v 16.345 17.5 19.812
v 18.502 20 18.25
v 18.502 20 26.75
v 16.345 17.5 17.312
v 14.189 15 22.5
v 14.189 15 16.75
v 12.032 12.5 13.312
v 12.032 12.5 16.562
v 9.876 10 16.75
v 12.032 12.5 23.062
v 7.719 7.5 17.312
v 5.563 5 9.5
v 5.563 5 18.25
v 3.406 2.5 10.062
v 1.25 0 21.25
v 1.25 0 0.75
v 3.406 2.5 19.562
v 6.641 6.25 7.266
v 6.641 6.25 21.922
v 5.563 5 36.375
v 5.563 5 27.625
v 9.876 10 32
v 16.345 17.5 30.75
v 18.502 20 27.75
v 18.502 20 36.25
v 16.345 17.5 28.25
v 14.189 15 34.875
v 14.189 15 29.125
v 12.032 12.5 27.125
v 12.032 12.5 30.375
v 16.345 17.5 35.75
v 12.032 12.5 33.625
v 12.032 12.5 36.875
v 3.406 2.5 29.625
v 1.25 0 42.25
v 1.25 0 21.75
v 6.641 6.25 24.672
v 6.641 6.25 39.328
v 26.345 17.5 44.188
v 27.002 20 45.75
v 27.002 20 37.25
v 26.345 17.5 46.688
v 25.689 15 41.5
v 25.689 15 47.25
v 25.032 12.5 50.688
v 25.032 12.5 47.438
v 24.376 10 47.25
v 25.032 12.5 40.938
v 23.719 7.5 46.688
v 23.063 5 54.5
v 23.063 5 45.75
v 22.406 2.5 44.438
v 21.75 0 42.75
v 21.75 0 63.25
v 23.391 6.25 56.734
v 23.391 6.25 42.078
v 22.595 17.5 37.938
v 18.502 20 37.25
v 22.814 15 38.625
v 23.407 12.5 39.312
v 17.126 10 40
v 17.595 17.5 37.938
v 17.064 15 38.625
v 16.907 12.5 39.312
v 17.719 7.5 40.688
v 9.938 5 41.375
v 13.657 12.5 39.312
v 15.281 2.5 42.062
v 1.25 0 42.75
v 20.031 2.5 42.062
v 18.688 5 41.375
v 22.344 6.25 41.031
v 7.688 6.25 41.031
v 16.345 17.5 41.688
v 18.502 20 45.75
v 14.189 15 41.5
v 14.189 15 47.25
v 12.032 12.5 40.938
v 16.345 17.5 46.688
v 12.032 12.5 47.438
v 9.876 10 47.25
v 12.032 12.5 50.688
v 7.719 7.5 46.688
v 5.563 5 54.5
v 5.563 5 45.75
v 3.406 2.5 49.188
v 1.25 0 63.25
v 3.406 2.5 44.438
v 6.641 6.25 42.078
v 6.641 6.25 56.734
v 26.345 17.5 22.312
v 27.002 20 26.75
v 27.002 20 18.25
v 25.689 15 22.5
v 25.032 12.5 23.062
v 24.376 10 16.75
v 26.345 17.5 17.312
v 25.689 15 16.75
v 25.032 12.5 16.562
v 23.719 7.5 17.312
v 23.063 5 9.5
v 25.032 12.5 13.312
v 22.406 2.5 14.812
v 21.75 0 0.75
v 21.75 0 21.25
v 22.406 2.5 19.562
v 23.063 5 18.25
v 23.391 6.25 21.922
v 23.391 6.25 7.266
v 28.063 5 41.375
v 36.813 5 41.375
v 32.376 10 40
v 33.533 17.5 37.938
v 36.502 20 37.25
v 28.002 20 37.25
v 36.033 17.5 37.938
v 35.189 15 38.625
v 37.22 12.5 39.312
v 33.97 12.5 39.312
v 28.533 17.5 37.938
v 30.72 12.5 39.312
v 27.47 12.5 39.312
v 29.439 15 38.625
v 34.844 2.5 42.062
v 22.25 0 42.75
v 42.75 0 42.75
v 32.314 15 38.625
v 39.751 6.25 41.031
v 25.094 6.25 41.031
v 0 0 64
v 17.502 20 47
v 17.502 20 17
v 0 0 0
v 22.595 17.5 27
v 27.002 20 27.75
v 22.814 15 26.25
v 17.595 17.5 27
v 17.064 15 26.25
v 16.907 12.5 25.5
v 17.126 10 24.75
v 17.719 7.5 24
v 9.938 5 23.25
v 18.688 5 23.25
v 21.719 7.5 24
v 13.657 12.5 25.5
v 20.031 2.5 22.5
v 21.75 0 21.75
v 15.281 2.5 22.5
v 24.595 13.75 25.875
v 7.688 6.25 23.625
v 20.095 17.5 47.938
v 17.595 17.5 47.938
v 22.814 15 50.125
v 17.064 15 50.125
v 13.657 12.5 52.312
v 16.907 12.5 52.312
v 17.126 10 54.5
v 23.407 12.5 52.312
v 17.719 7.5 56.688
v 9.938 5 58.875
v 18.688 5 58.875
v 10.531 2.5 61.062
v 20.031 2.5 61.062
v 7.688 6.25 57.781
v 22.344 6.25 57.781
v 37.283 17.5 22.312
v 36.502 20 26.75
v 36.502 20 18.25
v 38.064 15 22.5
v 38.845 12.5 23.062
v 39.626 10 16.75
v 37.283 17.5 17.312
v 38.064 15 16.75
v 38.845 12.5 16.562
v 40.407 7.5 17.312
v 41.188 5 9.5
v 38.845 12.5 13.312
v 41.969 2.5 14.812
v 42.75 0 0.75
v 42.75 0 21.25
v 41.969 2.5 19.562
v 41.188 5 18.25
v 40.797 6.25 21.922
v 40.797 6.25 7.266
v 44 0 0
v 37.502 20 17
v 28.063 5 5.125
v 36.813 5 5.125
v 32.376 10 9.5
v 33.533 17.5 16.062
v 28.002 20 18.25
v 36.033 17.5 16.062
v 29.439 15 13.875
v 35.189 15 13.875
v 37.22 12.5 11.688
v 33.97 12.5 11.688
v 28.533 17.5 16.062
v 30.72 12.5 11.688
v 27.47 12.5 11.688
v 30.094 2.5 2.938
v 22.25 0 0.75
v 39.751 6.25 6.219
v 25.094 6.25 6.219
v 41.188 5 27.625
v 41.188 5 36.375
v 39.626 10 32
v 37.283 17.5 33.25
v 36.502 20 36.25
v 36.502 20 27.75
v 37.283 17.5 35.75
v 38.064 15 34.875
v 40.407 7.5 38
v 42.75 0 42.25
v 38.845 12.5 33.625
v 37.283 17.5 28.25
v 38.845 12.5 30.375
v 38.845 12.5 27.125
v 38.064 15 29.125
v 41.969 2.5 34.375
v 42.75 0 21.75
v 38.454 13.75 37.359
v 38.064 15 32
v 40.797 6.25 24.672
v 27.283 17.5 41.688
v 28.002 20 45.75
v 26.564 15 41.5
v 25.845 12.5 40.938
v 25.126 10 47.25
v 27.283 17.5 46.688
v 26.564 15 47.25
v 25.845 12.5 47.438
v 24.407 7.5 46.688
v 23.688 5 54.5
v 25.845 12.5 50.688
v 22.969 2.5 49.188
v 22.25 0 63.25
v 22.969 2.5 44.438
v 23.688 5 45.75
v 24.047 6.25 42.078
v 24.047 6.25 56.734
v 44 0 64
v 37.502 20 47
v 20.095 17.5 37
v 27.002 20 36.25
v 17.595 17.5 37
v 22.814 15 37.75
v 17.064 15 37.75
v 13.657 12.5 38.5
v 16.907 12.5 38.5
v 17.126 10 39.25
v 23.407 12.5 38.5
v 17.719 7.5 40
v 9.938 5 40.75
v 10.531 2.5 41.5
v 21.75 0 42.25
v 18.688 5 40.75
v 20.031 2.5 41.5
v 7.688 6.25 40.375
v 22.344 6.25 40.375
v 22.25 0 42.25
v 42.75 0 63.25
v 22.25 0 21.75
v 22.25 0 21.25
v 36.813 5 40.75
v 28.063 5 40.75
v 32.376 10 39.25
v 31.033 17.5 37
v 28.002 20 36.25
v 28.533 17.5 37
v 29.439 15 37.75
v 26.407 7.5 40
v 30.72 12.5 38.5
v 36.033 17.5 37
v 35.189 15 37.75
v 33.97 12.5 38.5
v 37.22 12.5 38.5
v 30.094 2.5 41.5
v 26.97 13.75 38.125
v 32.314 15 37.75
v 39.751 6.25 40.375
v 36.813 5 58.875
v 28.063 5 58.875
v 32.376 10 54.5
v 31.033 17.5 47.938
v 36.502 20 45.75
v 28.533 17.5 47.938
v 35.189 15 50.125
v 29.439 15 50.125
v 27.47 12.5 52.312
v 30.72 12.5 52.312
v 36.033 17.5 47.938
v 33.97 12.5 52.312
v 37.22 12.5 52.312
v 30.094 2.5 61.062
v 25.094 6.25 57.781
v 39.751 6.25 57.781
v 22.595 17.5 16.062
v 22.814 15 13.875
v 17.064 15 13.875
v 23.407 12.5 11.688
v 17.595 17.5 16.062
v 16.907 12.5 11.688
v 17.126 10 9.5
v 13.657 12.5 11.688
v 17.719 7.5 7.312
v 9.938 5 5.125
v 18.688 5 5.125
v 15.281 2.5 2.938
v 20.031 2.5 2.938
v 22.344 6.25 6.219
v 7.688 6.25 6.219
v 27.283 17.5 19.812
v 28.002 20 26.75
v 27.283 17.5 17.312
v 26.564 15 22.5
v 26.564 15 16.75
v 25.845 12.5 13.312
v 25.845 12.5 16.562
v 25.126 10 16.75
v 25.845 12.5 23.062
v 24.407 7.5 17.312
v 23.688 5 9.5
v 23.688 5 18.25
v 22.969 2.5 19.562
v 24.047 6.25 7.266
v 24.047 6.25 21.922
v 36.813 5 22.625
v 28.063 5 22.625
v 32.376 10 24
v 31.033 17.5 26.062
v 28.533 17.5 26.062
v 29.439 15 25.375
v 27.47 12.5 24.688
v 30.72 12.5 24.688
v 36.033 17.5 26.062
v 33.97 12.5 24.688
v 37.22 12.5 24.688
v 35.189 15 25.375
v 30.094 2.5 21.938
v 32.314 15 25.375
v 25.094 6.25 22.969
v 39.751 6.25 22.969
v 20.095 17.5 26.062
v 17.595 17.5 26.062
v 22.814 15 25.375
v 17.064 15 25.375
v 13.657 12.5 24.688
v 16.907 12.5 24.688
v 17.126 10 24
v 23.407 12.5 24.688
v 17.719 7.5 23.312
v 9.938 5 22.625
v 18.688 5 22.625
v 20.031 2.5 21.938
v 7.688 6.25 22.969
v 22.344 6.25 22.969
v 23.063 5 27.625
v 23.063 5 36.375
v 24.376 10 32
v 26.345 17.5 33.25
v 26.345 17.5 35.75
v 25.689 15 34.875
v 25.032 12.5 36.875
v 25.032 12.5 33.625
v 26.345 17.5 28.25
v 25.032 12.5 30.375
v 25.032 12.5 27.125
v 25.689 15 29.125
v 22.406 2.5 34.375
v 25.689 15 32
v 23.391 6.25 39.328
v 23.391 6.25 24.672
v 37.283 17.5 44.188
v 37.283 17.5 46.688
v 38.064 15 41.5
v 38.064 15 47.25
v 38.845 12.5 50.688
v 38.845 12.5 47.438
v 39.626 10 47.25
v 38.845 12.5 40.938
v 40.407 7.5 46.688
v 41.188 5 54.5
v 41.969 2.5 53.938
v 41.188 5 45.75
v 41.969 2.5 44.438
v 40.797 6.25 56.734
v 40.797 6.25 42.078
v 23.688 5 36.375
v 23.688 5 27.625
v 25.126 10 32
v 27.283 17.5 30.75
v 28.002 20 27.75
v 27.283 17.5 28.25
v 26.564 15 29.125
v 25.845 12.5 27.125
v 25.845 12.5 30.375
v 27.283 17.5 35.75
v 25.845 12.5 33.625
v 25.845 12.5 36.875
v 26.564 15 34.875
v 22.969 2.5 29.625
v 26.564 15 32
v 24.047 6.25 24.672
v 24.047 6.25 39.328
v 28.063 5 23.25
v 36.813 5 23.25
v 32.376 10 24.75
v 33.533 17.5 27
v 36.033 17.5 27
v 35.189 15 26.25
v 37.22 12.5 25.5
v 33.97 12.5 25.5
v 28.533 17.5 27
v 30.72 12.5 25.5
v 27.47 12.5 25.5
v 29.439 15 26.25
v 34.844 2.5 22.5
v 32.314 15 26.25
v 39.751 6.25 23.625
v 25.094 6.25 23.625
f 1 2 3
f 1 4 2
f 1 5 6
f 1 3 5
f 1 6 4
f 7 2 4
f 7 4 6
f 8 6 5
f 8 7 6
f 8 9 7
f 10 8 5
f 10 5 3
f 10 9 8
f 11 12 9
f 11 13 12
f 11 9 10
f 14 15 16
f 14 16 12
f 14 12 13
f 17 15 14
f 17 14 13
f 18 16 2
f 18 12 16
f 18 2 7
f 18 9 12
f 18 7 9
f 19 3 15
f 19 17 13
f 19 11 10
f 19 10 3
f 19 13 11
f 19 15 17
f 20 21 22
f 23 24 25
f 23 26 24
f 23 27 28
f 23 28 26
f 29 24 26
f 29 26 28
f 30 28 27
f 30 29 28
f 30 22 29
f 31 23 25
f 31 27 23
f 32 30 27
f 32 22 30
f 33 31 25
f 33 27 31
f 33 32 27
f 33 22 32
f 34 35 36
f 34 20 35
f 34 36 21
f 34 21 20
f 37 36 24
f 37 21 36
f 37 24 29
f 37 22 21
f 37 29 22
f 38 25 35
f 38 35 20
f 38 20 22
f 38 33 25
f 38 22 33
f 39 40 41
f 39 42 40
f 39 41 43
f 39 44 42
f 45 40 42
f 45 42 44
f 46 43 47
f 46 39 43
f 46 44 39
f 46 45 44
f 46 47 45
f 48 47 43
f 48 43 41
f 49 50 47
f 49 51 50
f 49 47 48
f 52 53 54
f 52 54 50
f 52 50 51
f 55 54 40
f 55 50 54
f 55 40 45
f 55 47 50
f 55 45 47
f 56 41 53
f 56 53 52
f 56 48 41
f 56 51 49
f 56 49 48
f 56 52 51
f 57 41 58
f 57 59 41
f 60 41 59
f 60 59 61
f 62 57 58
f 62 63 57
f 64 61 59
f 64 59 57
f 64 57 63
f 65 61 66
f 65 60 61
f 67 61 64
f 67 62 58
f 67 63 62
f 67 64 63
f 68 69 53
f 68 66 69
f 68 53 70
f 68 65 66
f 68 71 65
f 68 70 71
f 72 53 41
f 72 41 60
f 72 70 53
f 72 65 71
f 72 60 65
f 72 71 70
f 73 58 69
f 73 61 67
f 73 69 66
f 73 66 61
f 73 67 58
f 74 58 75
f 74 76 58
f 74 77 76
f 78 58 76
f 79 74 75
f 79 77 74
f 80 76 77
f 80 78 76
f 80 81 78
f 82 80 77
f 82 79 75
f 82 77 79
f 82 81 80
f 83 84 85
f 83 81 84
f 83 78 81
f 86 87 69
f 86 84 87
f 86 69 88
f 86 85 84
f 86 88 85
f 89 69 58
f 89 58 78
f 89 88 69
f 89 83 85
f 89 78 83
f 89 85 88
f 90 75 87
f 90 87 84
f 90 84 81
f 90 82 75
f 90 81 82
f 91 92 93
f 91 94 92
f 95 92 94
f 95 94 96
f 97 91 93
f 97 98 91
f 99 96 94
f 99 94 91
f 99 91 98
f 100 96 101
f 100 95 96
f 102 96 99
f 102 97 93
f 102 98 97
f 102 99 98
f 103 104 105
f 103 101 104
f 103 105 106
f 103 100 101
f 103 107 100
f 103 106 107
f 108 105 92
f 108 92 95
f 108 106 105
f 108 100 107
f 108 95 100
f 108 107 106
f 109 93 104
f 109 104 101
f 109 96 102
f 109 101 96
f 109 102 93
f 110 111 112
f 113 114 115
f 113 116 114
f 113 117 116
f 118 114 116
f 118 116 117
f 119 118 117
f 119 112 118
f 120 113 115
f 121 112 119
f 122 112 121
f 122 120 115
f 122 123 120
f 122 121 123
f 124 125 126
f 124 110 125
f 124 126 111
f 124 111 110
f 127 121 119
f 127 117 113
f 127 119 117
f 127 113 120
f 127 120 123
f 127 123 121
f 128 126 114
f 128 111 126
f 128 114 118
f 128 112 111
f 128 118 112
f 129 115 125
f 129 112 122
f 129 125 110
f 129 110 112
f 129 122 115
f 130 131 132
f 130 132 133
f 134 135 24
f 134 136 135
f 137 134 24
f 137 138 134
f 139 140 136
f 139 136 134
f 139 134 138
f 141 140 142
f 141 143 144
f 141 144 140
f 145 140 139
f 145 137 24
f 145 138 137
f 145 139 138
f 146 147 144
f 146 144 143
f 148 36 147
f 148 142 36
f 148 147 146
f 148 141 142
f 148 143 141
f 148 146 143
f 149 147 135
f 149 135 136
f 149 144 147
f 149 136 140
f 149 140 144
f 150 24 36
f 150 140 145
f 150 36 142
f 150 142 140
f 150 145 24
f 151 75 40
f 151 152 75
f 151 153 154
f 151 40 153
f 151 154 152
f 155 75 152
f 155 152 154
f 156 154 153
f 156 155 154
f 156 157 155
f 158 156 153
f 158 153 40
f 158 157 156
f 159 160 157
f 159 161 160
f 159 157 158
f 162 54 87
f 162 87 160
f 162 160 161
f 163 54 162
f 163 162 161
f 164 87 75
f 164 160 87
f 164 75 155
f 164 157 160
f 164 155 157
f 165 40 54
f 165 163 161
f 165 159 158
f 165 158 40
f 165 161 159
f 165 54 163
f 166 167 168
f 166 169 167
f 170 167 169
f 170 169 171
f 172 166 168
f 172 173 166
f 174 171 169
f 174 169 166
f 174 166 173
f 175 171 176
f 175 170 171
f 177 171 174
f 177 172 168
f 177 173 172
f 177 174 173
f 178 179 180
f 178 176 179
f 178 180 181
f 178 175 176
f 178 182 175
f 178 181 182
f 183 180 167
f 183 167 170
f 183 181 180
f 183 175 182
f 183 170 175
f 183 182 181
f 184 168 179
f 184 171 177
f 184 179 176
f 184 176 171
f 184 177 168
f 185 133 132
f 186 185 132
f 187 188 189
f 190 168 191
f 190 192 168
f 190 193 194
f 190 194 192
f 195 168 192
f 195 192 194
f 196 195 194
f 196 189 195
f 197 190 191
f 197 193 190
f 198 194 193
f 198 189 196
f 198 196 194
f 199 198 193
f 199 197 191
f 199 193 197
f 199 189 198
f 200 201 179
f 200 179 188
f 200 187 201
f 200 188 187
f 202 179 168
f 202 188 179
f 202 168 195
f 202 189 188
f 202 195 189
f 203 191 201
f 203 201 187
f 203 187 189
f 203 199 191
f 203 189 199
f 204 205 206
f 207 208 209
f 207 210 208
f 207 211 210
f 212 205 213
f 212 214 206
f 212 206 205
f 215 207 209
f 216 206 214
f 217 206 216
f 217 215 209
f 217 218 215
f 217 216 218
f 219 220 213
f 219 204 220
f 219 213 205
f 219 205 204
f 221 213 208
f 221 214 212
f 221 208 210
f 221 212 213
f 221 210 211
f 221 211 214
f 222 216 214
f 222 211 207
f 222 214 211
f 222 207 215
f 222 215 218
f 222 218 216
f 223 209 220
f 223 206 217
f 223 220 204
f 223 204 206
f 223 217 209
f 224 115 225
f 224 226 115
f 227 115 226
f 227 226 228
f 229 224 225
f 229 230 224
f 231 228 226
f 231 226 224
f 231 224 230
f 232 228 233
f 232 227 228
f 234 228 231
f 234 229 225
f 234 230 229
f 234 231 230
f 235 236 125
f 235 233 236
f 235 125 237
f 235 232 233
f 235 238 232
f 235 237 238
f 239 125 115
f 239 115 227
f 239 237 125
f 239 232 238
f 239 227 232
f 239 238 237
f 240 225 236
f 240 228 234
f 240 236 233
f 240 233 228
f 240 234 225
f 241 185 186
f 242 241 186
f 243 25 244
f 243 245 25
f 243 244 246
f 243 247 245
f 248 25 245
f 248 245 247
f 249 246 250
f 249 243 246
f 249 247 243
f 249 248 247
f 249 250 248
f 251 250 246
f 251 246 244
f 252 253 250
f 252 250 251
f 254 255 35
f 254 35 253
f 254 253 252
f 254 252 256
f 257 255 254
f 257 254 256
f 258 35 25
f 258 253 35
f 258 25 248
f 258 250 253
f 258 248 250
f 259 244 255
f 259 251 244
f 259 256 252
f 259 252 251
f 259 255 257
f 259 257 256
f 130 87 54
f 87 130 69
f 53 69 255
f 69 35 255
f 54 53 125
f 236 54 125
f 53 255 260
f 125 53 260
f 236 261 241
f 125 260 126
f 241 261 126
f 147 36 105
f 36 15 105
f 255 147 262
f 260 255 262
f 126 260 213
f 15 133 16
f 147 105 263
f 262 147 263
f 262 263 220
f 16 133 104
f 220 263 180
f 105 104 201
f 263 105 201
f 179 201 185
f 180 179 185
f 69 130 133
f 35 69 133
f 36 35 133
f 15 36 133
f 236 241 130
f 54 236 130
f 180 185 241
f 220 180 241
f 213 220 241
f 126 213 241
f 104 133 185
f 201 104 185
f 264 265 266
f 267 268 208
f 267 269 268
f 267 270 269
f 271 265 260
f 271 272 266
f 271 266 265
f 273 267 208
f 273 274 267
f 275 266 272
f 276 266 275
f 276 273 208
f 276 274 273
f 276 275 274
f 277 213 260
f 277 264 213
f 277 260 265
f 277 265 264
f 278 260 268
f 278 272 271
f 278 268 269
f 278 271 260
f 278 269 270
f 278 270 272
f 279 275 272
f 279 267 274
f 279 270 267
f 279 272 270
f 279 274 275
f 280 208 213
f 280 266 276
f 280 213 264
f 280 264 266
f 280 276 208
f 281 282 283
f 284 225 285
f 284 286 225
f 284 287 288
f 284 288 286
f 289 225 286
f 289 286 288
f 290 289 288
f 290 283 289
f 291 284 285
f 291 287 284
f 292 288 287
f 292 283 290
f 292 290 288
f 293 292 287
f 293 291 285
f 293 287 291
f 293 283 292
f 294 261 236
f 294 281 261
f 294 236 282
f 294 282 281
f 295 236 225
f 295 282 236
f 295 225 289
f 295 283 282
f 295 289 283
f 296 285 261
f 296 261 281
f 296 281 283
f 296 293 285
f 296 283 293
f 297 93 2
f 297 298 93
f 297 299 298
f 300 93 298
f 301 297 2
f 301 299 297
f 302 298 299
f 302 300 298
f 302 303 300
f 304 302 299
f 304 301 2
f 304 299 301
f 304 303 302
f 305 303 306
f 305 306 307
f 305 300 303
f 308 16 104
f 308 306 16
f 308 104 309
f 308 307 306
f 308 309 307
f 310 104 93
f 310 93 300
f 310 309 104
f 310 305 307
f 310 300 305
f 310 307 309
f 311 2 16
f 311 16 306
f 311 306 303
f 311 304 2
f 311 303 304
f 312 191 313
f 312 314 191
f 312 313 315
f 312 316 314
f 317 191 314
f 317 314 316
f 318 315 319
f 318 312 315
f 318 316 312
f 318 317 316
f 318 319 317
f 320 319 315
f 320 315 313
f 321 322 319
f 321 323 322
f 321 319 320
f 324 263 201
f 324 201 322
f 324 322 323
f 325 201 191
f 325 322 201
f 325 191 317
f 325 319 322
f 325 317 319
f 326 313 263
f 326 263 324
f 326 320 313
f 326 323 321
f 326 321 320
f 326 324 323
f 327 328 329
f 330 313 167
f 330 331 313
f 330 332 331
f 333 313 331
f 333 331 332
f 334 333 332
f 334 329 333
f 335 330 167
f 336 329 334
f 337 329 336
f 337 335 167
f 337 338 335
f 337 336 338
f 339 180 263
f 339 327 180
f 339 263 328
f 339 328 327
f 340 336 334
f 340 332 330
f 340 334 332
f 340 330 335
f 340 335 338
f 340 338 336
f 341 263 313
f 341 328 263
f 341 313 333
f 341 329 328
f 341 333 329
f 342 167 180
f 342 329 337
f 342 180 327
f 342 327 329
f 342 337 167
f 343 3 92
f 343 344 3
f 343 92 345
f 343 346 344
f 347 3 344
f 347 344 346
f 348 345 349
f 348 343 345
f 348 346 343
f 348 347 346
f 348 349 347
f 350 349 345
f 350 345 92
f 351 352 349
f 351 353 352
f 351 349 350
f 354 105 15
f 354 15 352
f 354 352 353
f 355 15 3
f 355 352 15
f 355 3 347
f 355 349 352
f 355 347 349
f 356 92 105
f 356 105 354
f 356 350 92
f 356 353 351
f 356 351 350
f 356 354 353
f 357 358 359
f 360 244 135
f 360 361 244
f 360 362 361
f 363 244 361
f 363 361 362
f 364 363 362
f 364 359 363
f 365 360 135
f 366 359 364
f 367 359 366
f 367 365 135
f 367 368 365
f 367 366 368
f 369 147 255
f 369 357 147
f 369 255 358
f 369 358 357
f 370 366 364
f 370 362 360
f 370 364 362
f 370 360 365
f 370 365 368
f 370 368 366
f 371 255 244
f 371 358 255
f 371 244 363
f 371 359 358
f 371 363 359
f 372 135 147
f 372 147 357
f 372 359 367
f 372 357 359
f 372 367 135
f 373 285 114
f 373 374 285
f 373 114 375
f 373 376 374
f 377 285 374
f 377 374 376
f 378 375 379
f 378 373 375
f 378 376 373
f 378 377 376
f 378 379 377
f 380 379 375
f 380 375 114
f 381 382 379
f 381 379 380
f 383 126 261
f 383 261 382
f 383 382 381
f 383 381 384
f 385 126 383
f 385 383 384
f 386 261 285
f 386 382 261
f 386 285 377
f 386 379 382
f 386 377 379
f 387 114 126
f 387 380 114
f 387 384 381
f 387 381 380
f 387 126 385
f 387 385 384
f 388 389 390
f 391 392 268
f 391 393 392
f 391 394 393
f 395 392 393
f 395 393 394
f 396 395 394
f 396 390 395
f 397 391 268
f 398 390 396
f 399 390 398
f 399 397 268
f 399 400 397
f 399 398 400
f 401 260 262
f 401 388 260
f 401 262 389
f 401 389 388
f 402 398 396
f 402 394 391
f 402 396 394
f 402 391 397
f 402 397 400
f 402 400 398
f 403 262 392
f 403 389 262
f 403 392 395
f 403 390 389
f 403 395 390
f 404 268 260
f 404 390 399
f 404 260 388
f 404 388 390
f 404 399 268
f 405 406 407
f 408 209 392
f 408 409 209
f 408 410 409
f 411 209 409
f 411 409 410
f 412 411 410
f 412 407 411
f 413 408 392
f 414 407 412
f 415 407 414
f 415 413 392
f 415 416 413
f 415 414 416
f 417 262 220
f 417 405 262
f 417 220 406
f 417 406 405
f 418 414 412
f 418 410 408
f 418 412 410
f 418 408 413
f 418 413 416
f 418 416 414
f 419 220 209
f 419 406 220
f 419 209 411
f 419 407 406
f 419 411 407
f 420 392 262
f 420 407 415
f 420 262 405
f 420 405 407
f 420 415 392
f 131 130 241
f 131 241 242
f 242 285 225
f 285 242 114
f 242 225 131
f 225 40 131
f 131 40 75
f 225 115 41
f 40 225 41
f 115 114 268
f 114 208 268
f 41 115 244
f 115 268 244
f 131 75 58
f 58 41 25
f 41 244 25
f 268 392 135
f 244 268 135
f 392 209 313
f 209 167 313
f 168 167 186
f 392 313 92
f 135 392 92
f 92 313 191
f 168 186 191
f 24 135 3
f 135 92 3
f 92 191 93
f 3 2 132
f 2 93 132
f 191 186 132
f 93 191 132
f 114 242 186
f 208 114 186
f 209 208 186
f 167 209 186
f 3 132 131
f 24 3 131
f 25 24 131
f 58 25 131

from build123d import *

# Parameters (mm, degrees)
EXTRUDE_1_DEPTH          = 64
CUT_EXTRUDE_1_DEPTH      = 73.098300123
CUT_EXTRUDE_1_DEPTH_BACK = 73.098300123


with BuildPart() as part:
    # ｽｹｯﾁ1 → ﾎﾞｽ - 押し出し1 (new body)
    with BuildSketch(Plane.XY):
        Polygon((0, 0), (44, 0), (37.501606075, 20), (17.501606075, 20), align=None)
    extrude(amount=EXTRUDE_1_DEPTH)

    # ｽｹｯﾁ2 → ｶｯﾄ - 押し出し1 (cut, two sides: drawn at the far end of the back side and taken through both)
    with BuildSketch(Plane.ZY.offset(-17.501606075).offset(-CUT_EXTRUDE_1_DEPTH_BACK)):
        Polygon((0, 0), (17, 20), (0, 20), align=None)
        Polygon((64, 0), (47, 20), (64, 20), align=None)
    extrude(amount=CUT_EXTRUDE_1_DEPTH + CUT_EXTRUDE_1_DEPTH_BACK, mode=Mode.SUBTRACT)

    # ｽｹｯﾁ4 → ｶｯﾄ - ﾛﾌﾄ1 section 0
    with BuildSketch(Plane(origin=(0, 20, 0), x_dir=(1, 0, 0), z_dir=(0, 1, 0))):
        with BuildLine():
            Line((18.501606075, -18.25), (18.501606075, -26.75))
            Line((18.501606075, -26.75), (27.001606075, -26.75))
            Line((27.001606075, -26.75), (27.001606075, -18.25))
            Line((27.001606075, -18.25), (18.501606075, -18.25))
        make_face()
    # ｽｹｯﾁ3 → ｶｯﾄ - ﾛﾌﾄ1 section 1
    with BuildSketch(Plane.XZ):
        with BuildLine():
            Line((1.25, 21.25), (1.25, 0.75))
            Line((1.25, 0.75), (21.75, 0.75))
            Line((21.75, 0.75), (21.75, 21.25))
            Line((21.75, 21.25), (1.25, 21.25))
        make_face()
    loft(mode=Mode.SUBTRACT)

    # ｽｹｯﾁ4<3> → ｶｯﾄ - ﾛﾌﾄ2 section 0
    with BuildSketch(Plane(origin=(0, 20, 0), x_dir=(1, 0, 0), z_dir=(0, 1, 0))):
        with BuildLine():
            Line((18.501606075, -27.75), (18.501606075, -36.25))
            Line((18.501606075, -36.25), (27.001606075, -36.25))
            Line((27.001606075, -36.25), (27.001606075, -27.75))
            Line((27.001606075, -27.75), (18.501606075, -27.75))
        make_face()
    # ｽｹｯﾁ3<3> → ｶｯﾄ - ﾛﾌﾄ2 section 1
    with BuildSketch(Plane.XZ):
        with BuildLine():
            Line((1.25, 42.25), (1.25, 21.75))
            Line((1.25, 21.75), (21.75, 21.75))
            Line((21.75, 21.75), (21.75, 42.25))
            Line((21.75, 42.25), (1.25, 42.25))
        make_face()
    loft(mode=Mode.SUBTRACT)

    # ｽｹｯﾁ4<4> → ｶｯﾄ - ﾛﾌﾄ3 section 0
    with BuildSketch(Plane(origin=(0, 20, 0), x_dir=(1, 0, 0), z_dir=(0, 1, 0))):
        with BuildLine():
            Line((18.501606075, -37.25), (18.501606075, -45.75))
            Line((18.501606075, -45.75), (27.001606075, -45.75))
            Line((27.001606075, -45.75), (27.001606075, -37.25))
            Line((27.001606075, -37.25), (18.501606075, -37.25))
        make_face()
    # ｽｹｯﾁ3<4> → ｶｯﾄ - ﾛﾌﾄ3 section 1
    with BuildSketch(Plane.XZ):
        with BuildLine():
            Line((1.25, 63.25), (1.25, 42.75))
            Line((1.25, 42.75), (21.75, 42.75))
            Line((21.75, 42.75), (21.75, 63.25))
            Line((21.75, 63.25), (1.25, 63.25))
        make_face()
    loft(mode=Mode.SUBTRACT)

    # ｽｹｯﾁ4<5> → ｶｯﾄ - ﾛﾌﾄ4 section 0
    with BuildSketch(Plane(origin=(0, 20, 0), x_dir=(1, 0, 0), z_dir=(0, 1, 0))):
        with BuildLine():
            Line((28.001606075, -18.25), (36.501606075, -18.25))
            Line((36.501606075, -18.25), (36.501606075, -26.75))
            Line((36.501606075, -26.75), (28.001606075, -26.75))
            Line((28.001606075, -26.75), (28.001606075, -18.25))
        make_face()
    # ｽｹｯﾁ3<5> → ｶｯﾄ - ﾛﾌﾄ4 section 1
    with BuildSketch(Plane.XZ):
        with BuildLine():
            Line((22.25, 21.25), (22.25, 0.75))
            Line((22.25, 0.75), (42.75, 0.75))
            Line((42.75, 0.75), (42.75, 21.25))
            Line((42.75, 21.25), (22.25, 21.25))
        make_face()
    loft(mode=Mode.SUBTRACT)

    # ｽｹｯﾁ4<6> → ｶｯﾄ - ﾛﾌﾄ5 section 0
    with BuildSketch(Plane(origin=(0, 20, 0), x_dir=(1, 0, 0), z_dir=(0, 1, 0))):
        with BuildLine():
            Line((28.001606075, -27.75), (28.001606075, -36.25))
            Line((28.001606075, -36.25), (36.501606075, -36.25))
            Line((36.501606075, -36.25), (36.501606075, -27.75))
            Line((36.501606075, -27.75), (28.001606075, -27.75))
        make_face()
    # ｽｹｯﾁ3<6> → ｶｯﾄ - ﾛﾌﾄ5 section 1
    with BuildSketch(Plane.XZ):
        with BuildLine():
            Line((22.25, 42.25), (22.25, 21.75))
            Line((22.25, 21.75), (42.75, 21.75))
            Line((42.75, 21.75), (42.75, 42.25))
            Line((42.75, 42.25), (22.25, 42.25))
        make_face()
    loft(mode=Mode.SUBTRACT)

    # ｽｹｯﾁ4<7> → ｶｯﾄ - ﾛﾌﾄ6 section 0
    with BuildSketch(Plane(origin=(0, 20, 0), x_dir=(1, 0, 0), z_dir=(0, 1, 0))):
        with BuildLine():
            Line((28.001606075, -37.25), (28.001606075, -45.75))
            Line((28.001606075, -45.75), (36.501606075, -45.75))
            Line((36.501606075, -45.75), (36.501606075, -37.25))
            Line((36.501606075, -37.25), (28.001606075, -37.25))
        make_face()
    # ｽｹｯﾁ3<7> → ｶｯﾄ - ﾛﾌﾄ6 section 1
    with BuildSketch(Plane.XZ):
        with BuildLine():
            Line((22.25, 63.25), (42.75, 63.25))
            Line((42.75, 63.25), (42.75, 42.75))
            Line((42.75, 42.75), (22.25, 42.75))
            Line((22.25, 42.75), (22.25, 63.25))
        make_face()
    loft(mode=Mode.SUBTRACT)


solid = part.part
